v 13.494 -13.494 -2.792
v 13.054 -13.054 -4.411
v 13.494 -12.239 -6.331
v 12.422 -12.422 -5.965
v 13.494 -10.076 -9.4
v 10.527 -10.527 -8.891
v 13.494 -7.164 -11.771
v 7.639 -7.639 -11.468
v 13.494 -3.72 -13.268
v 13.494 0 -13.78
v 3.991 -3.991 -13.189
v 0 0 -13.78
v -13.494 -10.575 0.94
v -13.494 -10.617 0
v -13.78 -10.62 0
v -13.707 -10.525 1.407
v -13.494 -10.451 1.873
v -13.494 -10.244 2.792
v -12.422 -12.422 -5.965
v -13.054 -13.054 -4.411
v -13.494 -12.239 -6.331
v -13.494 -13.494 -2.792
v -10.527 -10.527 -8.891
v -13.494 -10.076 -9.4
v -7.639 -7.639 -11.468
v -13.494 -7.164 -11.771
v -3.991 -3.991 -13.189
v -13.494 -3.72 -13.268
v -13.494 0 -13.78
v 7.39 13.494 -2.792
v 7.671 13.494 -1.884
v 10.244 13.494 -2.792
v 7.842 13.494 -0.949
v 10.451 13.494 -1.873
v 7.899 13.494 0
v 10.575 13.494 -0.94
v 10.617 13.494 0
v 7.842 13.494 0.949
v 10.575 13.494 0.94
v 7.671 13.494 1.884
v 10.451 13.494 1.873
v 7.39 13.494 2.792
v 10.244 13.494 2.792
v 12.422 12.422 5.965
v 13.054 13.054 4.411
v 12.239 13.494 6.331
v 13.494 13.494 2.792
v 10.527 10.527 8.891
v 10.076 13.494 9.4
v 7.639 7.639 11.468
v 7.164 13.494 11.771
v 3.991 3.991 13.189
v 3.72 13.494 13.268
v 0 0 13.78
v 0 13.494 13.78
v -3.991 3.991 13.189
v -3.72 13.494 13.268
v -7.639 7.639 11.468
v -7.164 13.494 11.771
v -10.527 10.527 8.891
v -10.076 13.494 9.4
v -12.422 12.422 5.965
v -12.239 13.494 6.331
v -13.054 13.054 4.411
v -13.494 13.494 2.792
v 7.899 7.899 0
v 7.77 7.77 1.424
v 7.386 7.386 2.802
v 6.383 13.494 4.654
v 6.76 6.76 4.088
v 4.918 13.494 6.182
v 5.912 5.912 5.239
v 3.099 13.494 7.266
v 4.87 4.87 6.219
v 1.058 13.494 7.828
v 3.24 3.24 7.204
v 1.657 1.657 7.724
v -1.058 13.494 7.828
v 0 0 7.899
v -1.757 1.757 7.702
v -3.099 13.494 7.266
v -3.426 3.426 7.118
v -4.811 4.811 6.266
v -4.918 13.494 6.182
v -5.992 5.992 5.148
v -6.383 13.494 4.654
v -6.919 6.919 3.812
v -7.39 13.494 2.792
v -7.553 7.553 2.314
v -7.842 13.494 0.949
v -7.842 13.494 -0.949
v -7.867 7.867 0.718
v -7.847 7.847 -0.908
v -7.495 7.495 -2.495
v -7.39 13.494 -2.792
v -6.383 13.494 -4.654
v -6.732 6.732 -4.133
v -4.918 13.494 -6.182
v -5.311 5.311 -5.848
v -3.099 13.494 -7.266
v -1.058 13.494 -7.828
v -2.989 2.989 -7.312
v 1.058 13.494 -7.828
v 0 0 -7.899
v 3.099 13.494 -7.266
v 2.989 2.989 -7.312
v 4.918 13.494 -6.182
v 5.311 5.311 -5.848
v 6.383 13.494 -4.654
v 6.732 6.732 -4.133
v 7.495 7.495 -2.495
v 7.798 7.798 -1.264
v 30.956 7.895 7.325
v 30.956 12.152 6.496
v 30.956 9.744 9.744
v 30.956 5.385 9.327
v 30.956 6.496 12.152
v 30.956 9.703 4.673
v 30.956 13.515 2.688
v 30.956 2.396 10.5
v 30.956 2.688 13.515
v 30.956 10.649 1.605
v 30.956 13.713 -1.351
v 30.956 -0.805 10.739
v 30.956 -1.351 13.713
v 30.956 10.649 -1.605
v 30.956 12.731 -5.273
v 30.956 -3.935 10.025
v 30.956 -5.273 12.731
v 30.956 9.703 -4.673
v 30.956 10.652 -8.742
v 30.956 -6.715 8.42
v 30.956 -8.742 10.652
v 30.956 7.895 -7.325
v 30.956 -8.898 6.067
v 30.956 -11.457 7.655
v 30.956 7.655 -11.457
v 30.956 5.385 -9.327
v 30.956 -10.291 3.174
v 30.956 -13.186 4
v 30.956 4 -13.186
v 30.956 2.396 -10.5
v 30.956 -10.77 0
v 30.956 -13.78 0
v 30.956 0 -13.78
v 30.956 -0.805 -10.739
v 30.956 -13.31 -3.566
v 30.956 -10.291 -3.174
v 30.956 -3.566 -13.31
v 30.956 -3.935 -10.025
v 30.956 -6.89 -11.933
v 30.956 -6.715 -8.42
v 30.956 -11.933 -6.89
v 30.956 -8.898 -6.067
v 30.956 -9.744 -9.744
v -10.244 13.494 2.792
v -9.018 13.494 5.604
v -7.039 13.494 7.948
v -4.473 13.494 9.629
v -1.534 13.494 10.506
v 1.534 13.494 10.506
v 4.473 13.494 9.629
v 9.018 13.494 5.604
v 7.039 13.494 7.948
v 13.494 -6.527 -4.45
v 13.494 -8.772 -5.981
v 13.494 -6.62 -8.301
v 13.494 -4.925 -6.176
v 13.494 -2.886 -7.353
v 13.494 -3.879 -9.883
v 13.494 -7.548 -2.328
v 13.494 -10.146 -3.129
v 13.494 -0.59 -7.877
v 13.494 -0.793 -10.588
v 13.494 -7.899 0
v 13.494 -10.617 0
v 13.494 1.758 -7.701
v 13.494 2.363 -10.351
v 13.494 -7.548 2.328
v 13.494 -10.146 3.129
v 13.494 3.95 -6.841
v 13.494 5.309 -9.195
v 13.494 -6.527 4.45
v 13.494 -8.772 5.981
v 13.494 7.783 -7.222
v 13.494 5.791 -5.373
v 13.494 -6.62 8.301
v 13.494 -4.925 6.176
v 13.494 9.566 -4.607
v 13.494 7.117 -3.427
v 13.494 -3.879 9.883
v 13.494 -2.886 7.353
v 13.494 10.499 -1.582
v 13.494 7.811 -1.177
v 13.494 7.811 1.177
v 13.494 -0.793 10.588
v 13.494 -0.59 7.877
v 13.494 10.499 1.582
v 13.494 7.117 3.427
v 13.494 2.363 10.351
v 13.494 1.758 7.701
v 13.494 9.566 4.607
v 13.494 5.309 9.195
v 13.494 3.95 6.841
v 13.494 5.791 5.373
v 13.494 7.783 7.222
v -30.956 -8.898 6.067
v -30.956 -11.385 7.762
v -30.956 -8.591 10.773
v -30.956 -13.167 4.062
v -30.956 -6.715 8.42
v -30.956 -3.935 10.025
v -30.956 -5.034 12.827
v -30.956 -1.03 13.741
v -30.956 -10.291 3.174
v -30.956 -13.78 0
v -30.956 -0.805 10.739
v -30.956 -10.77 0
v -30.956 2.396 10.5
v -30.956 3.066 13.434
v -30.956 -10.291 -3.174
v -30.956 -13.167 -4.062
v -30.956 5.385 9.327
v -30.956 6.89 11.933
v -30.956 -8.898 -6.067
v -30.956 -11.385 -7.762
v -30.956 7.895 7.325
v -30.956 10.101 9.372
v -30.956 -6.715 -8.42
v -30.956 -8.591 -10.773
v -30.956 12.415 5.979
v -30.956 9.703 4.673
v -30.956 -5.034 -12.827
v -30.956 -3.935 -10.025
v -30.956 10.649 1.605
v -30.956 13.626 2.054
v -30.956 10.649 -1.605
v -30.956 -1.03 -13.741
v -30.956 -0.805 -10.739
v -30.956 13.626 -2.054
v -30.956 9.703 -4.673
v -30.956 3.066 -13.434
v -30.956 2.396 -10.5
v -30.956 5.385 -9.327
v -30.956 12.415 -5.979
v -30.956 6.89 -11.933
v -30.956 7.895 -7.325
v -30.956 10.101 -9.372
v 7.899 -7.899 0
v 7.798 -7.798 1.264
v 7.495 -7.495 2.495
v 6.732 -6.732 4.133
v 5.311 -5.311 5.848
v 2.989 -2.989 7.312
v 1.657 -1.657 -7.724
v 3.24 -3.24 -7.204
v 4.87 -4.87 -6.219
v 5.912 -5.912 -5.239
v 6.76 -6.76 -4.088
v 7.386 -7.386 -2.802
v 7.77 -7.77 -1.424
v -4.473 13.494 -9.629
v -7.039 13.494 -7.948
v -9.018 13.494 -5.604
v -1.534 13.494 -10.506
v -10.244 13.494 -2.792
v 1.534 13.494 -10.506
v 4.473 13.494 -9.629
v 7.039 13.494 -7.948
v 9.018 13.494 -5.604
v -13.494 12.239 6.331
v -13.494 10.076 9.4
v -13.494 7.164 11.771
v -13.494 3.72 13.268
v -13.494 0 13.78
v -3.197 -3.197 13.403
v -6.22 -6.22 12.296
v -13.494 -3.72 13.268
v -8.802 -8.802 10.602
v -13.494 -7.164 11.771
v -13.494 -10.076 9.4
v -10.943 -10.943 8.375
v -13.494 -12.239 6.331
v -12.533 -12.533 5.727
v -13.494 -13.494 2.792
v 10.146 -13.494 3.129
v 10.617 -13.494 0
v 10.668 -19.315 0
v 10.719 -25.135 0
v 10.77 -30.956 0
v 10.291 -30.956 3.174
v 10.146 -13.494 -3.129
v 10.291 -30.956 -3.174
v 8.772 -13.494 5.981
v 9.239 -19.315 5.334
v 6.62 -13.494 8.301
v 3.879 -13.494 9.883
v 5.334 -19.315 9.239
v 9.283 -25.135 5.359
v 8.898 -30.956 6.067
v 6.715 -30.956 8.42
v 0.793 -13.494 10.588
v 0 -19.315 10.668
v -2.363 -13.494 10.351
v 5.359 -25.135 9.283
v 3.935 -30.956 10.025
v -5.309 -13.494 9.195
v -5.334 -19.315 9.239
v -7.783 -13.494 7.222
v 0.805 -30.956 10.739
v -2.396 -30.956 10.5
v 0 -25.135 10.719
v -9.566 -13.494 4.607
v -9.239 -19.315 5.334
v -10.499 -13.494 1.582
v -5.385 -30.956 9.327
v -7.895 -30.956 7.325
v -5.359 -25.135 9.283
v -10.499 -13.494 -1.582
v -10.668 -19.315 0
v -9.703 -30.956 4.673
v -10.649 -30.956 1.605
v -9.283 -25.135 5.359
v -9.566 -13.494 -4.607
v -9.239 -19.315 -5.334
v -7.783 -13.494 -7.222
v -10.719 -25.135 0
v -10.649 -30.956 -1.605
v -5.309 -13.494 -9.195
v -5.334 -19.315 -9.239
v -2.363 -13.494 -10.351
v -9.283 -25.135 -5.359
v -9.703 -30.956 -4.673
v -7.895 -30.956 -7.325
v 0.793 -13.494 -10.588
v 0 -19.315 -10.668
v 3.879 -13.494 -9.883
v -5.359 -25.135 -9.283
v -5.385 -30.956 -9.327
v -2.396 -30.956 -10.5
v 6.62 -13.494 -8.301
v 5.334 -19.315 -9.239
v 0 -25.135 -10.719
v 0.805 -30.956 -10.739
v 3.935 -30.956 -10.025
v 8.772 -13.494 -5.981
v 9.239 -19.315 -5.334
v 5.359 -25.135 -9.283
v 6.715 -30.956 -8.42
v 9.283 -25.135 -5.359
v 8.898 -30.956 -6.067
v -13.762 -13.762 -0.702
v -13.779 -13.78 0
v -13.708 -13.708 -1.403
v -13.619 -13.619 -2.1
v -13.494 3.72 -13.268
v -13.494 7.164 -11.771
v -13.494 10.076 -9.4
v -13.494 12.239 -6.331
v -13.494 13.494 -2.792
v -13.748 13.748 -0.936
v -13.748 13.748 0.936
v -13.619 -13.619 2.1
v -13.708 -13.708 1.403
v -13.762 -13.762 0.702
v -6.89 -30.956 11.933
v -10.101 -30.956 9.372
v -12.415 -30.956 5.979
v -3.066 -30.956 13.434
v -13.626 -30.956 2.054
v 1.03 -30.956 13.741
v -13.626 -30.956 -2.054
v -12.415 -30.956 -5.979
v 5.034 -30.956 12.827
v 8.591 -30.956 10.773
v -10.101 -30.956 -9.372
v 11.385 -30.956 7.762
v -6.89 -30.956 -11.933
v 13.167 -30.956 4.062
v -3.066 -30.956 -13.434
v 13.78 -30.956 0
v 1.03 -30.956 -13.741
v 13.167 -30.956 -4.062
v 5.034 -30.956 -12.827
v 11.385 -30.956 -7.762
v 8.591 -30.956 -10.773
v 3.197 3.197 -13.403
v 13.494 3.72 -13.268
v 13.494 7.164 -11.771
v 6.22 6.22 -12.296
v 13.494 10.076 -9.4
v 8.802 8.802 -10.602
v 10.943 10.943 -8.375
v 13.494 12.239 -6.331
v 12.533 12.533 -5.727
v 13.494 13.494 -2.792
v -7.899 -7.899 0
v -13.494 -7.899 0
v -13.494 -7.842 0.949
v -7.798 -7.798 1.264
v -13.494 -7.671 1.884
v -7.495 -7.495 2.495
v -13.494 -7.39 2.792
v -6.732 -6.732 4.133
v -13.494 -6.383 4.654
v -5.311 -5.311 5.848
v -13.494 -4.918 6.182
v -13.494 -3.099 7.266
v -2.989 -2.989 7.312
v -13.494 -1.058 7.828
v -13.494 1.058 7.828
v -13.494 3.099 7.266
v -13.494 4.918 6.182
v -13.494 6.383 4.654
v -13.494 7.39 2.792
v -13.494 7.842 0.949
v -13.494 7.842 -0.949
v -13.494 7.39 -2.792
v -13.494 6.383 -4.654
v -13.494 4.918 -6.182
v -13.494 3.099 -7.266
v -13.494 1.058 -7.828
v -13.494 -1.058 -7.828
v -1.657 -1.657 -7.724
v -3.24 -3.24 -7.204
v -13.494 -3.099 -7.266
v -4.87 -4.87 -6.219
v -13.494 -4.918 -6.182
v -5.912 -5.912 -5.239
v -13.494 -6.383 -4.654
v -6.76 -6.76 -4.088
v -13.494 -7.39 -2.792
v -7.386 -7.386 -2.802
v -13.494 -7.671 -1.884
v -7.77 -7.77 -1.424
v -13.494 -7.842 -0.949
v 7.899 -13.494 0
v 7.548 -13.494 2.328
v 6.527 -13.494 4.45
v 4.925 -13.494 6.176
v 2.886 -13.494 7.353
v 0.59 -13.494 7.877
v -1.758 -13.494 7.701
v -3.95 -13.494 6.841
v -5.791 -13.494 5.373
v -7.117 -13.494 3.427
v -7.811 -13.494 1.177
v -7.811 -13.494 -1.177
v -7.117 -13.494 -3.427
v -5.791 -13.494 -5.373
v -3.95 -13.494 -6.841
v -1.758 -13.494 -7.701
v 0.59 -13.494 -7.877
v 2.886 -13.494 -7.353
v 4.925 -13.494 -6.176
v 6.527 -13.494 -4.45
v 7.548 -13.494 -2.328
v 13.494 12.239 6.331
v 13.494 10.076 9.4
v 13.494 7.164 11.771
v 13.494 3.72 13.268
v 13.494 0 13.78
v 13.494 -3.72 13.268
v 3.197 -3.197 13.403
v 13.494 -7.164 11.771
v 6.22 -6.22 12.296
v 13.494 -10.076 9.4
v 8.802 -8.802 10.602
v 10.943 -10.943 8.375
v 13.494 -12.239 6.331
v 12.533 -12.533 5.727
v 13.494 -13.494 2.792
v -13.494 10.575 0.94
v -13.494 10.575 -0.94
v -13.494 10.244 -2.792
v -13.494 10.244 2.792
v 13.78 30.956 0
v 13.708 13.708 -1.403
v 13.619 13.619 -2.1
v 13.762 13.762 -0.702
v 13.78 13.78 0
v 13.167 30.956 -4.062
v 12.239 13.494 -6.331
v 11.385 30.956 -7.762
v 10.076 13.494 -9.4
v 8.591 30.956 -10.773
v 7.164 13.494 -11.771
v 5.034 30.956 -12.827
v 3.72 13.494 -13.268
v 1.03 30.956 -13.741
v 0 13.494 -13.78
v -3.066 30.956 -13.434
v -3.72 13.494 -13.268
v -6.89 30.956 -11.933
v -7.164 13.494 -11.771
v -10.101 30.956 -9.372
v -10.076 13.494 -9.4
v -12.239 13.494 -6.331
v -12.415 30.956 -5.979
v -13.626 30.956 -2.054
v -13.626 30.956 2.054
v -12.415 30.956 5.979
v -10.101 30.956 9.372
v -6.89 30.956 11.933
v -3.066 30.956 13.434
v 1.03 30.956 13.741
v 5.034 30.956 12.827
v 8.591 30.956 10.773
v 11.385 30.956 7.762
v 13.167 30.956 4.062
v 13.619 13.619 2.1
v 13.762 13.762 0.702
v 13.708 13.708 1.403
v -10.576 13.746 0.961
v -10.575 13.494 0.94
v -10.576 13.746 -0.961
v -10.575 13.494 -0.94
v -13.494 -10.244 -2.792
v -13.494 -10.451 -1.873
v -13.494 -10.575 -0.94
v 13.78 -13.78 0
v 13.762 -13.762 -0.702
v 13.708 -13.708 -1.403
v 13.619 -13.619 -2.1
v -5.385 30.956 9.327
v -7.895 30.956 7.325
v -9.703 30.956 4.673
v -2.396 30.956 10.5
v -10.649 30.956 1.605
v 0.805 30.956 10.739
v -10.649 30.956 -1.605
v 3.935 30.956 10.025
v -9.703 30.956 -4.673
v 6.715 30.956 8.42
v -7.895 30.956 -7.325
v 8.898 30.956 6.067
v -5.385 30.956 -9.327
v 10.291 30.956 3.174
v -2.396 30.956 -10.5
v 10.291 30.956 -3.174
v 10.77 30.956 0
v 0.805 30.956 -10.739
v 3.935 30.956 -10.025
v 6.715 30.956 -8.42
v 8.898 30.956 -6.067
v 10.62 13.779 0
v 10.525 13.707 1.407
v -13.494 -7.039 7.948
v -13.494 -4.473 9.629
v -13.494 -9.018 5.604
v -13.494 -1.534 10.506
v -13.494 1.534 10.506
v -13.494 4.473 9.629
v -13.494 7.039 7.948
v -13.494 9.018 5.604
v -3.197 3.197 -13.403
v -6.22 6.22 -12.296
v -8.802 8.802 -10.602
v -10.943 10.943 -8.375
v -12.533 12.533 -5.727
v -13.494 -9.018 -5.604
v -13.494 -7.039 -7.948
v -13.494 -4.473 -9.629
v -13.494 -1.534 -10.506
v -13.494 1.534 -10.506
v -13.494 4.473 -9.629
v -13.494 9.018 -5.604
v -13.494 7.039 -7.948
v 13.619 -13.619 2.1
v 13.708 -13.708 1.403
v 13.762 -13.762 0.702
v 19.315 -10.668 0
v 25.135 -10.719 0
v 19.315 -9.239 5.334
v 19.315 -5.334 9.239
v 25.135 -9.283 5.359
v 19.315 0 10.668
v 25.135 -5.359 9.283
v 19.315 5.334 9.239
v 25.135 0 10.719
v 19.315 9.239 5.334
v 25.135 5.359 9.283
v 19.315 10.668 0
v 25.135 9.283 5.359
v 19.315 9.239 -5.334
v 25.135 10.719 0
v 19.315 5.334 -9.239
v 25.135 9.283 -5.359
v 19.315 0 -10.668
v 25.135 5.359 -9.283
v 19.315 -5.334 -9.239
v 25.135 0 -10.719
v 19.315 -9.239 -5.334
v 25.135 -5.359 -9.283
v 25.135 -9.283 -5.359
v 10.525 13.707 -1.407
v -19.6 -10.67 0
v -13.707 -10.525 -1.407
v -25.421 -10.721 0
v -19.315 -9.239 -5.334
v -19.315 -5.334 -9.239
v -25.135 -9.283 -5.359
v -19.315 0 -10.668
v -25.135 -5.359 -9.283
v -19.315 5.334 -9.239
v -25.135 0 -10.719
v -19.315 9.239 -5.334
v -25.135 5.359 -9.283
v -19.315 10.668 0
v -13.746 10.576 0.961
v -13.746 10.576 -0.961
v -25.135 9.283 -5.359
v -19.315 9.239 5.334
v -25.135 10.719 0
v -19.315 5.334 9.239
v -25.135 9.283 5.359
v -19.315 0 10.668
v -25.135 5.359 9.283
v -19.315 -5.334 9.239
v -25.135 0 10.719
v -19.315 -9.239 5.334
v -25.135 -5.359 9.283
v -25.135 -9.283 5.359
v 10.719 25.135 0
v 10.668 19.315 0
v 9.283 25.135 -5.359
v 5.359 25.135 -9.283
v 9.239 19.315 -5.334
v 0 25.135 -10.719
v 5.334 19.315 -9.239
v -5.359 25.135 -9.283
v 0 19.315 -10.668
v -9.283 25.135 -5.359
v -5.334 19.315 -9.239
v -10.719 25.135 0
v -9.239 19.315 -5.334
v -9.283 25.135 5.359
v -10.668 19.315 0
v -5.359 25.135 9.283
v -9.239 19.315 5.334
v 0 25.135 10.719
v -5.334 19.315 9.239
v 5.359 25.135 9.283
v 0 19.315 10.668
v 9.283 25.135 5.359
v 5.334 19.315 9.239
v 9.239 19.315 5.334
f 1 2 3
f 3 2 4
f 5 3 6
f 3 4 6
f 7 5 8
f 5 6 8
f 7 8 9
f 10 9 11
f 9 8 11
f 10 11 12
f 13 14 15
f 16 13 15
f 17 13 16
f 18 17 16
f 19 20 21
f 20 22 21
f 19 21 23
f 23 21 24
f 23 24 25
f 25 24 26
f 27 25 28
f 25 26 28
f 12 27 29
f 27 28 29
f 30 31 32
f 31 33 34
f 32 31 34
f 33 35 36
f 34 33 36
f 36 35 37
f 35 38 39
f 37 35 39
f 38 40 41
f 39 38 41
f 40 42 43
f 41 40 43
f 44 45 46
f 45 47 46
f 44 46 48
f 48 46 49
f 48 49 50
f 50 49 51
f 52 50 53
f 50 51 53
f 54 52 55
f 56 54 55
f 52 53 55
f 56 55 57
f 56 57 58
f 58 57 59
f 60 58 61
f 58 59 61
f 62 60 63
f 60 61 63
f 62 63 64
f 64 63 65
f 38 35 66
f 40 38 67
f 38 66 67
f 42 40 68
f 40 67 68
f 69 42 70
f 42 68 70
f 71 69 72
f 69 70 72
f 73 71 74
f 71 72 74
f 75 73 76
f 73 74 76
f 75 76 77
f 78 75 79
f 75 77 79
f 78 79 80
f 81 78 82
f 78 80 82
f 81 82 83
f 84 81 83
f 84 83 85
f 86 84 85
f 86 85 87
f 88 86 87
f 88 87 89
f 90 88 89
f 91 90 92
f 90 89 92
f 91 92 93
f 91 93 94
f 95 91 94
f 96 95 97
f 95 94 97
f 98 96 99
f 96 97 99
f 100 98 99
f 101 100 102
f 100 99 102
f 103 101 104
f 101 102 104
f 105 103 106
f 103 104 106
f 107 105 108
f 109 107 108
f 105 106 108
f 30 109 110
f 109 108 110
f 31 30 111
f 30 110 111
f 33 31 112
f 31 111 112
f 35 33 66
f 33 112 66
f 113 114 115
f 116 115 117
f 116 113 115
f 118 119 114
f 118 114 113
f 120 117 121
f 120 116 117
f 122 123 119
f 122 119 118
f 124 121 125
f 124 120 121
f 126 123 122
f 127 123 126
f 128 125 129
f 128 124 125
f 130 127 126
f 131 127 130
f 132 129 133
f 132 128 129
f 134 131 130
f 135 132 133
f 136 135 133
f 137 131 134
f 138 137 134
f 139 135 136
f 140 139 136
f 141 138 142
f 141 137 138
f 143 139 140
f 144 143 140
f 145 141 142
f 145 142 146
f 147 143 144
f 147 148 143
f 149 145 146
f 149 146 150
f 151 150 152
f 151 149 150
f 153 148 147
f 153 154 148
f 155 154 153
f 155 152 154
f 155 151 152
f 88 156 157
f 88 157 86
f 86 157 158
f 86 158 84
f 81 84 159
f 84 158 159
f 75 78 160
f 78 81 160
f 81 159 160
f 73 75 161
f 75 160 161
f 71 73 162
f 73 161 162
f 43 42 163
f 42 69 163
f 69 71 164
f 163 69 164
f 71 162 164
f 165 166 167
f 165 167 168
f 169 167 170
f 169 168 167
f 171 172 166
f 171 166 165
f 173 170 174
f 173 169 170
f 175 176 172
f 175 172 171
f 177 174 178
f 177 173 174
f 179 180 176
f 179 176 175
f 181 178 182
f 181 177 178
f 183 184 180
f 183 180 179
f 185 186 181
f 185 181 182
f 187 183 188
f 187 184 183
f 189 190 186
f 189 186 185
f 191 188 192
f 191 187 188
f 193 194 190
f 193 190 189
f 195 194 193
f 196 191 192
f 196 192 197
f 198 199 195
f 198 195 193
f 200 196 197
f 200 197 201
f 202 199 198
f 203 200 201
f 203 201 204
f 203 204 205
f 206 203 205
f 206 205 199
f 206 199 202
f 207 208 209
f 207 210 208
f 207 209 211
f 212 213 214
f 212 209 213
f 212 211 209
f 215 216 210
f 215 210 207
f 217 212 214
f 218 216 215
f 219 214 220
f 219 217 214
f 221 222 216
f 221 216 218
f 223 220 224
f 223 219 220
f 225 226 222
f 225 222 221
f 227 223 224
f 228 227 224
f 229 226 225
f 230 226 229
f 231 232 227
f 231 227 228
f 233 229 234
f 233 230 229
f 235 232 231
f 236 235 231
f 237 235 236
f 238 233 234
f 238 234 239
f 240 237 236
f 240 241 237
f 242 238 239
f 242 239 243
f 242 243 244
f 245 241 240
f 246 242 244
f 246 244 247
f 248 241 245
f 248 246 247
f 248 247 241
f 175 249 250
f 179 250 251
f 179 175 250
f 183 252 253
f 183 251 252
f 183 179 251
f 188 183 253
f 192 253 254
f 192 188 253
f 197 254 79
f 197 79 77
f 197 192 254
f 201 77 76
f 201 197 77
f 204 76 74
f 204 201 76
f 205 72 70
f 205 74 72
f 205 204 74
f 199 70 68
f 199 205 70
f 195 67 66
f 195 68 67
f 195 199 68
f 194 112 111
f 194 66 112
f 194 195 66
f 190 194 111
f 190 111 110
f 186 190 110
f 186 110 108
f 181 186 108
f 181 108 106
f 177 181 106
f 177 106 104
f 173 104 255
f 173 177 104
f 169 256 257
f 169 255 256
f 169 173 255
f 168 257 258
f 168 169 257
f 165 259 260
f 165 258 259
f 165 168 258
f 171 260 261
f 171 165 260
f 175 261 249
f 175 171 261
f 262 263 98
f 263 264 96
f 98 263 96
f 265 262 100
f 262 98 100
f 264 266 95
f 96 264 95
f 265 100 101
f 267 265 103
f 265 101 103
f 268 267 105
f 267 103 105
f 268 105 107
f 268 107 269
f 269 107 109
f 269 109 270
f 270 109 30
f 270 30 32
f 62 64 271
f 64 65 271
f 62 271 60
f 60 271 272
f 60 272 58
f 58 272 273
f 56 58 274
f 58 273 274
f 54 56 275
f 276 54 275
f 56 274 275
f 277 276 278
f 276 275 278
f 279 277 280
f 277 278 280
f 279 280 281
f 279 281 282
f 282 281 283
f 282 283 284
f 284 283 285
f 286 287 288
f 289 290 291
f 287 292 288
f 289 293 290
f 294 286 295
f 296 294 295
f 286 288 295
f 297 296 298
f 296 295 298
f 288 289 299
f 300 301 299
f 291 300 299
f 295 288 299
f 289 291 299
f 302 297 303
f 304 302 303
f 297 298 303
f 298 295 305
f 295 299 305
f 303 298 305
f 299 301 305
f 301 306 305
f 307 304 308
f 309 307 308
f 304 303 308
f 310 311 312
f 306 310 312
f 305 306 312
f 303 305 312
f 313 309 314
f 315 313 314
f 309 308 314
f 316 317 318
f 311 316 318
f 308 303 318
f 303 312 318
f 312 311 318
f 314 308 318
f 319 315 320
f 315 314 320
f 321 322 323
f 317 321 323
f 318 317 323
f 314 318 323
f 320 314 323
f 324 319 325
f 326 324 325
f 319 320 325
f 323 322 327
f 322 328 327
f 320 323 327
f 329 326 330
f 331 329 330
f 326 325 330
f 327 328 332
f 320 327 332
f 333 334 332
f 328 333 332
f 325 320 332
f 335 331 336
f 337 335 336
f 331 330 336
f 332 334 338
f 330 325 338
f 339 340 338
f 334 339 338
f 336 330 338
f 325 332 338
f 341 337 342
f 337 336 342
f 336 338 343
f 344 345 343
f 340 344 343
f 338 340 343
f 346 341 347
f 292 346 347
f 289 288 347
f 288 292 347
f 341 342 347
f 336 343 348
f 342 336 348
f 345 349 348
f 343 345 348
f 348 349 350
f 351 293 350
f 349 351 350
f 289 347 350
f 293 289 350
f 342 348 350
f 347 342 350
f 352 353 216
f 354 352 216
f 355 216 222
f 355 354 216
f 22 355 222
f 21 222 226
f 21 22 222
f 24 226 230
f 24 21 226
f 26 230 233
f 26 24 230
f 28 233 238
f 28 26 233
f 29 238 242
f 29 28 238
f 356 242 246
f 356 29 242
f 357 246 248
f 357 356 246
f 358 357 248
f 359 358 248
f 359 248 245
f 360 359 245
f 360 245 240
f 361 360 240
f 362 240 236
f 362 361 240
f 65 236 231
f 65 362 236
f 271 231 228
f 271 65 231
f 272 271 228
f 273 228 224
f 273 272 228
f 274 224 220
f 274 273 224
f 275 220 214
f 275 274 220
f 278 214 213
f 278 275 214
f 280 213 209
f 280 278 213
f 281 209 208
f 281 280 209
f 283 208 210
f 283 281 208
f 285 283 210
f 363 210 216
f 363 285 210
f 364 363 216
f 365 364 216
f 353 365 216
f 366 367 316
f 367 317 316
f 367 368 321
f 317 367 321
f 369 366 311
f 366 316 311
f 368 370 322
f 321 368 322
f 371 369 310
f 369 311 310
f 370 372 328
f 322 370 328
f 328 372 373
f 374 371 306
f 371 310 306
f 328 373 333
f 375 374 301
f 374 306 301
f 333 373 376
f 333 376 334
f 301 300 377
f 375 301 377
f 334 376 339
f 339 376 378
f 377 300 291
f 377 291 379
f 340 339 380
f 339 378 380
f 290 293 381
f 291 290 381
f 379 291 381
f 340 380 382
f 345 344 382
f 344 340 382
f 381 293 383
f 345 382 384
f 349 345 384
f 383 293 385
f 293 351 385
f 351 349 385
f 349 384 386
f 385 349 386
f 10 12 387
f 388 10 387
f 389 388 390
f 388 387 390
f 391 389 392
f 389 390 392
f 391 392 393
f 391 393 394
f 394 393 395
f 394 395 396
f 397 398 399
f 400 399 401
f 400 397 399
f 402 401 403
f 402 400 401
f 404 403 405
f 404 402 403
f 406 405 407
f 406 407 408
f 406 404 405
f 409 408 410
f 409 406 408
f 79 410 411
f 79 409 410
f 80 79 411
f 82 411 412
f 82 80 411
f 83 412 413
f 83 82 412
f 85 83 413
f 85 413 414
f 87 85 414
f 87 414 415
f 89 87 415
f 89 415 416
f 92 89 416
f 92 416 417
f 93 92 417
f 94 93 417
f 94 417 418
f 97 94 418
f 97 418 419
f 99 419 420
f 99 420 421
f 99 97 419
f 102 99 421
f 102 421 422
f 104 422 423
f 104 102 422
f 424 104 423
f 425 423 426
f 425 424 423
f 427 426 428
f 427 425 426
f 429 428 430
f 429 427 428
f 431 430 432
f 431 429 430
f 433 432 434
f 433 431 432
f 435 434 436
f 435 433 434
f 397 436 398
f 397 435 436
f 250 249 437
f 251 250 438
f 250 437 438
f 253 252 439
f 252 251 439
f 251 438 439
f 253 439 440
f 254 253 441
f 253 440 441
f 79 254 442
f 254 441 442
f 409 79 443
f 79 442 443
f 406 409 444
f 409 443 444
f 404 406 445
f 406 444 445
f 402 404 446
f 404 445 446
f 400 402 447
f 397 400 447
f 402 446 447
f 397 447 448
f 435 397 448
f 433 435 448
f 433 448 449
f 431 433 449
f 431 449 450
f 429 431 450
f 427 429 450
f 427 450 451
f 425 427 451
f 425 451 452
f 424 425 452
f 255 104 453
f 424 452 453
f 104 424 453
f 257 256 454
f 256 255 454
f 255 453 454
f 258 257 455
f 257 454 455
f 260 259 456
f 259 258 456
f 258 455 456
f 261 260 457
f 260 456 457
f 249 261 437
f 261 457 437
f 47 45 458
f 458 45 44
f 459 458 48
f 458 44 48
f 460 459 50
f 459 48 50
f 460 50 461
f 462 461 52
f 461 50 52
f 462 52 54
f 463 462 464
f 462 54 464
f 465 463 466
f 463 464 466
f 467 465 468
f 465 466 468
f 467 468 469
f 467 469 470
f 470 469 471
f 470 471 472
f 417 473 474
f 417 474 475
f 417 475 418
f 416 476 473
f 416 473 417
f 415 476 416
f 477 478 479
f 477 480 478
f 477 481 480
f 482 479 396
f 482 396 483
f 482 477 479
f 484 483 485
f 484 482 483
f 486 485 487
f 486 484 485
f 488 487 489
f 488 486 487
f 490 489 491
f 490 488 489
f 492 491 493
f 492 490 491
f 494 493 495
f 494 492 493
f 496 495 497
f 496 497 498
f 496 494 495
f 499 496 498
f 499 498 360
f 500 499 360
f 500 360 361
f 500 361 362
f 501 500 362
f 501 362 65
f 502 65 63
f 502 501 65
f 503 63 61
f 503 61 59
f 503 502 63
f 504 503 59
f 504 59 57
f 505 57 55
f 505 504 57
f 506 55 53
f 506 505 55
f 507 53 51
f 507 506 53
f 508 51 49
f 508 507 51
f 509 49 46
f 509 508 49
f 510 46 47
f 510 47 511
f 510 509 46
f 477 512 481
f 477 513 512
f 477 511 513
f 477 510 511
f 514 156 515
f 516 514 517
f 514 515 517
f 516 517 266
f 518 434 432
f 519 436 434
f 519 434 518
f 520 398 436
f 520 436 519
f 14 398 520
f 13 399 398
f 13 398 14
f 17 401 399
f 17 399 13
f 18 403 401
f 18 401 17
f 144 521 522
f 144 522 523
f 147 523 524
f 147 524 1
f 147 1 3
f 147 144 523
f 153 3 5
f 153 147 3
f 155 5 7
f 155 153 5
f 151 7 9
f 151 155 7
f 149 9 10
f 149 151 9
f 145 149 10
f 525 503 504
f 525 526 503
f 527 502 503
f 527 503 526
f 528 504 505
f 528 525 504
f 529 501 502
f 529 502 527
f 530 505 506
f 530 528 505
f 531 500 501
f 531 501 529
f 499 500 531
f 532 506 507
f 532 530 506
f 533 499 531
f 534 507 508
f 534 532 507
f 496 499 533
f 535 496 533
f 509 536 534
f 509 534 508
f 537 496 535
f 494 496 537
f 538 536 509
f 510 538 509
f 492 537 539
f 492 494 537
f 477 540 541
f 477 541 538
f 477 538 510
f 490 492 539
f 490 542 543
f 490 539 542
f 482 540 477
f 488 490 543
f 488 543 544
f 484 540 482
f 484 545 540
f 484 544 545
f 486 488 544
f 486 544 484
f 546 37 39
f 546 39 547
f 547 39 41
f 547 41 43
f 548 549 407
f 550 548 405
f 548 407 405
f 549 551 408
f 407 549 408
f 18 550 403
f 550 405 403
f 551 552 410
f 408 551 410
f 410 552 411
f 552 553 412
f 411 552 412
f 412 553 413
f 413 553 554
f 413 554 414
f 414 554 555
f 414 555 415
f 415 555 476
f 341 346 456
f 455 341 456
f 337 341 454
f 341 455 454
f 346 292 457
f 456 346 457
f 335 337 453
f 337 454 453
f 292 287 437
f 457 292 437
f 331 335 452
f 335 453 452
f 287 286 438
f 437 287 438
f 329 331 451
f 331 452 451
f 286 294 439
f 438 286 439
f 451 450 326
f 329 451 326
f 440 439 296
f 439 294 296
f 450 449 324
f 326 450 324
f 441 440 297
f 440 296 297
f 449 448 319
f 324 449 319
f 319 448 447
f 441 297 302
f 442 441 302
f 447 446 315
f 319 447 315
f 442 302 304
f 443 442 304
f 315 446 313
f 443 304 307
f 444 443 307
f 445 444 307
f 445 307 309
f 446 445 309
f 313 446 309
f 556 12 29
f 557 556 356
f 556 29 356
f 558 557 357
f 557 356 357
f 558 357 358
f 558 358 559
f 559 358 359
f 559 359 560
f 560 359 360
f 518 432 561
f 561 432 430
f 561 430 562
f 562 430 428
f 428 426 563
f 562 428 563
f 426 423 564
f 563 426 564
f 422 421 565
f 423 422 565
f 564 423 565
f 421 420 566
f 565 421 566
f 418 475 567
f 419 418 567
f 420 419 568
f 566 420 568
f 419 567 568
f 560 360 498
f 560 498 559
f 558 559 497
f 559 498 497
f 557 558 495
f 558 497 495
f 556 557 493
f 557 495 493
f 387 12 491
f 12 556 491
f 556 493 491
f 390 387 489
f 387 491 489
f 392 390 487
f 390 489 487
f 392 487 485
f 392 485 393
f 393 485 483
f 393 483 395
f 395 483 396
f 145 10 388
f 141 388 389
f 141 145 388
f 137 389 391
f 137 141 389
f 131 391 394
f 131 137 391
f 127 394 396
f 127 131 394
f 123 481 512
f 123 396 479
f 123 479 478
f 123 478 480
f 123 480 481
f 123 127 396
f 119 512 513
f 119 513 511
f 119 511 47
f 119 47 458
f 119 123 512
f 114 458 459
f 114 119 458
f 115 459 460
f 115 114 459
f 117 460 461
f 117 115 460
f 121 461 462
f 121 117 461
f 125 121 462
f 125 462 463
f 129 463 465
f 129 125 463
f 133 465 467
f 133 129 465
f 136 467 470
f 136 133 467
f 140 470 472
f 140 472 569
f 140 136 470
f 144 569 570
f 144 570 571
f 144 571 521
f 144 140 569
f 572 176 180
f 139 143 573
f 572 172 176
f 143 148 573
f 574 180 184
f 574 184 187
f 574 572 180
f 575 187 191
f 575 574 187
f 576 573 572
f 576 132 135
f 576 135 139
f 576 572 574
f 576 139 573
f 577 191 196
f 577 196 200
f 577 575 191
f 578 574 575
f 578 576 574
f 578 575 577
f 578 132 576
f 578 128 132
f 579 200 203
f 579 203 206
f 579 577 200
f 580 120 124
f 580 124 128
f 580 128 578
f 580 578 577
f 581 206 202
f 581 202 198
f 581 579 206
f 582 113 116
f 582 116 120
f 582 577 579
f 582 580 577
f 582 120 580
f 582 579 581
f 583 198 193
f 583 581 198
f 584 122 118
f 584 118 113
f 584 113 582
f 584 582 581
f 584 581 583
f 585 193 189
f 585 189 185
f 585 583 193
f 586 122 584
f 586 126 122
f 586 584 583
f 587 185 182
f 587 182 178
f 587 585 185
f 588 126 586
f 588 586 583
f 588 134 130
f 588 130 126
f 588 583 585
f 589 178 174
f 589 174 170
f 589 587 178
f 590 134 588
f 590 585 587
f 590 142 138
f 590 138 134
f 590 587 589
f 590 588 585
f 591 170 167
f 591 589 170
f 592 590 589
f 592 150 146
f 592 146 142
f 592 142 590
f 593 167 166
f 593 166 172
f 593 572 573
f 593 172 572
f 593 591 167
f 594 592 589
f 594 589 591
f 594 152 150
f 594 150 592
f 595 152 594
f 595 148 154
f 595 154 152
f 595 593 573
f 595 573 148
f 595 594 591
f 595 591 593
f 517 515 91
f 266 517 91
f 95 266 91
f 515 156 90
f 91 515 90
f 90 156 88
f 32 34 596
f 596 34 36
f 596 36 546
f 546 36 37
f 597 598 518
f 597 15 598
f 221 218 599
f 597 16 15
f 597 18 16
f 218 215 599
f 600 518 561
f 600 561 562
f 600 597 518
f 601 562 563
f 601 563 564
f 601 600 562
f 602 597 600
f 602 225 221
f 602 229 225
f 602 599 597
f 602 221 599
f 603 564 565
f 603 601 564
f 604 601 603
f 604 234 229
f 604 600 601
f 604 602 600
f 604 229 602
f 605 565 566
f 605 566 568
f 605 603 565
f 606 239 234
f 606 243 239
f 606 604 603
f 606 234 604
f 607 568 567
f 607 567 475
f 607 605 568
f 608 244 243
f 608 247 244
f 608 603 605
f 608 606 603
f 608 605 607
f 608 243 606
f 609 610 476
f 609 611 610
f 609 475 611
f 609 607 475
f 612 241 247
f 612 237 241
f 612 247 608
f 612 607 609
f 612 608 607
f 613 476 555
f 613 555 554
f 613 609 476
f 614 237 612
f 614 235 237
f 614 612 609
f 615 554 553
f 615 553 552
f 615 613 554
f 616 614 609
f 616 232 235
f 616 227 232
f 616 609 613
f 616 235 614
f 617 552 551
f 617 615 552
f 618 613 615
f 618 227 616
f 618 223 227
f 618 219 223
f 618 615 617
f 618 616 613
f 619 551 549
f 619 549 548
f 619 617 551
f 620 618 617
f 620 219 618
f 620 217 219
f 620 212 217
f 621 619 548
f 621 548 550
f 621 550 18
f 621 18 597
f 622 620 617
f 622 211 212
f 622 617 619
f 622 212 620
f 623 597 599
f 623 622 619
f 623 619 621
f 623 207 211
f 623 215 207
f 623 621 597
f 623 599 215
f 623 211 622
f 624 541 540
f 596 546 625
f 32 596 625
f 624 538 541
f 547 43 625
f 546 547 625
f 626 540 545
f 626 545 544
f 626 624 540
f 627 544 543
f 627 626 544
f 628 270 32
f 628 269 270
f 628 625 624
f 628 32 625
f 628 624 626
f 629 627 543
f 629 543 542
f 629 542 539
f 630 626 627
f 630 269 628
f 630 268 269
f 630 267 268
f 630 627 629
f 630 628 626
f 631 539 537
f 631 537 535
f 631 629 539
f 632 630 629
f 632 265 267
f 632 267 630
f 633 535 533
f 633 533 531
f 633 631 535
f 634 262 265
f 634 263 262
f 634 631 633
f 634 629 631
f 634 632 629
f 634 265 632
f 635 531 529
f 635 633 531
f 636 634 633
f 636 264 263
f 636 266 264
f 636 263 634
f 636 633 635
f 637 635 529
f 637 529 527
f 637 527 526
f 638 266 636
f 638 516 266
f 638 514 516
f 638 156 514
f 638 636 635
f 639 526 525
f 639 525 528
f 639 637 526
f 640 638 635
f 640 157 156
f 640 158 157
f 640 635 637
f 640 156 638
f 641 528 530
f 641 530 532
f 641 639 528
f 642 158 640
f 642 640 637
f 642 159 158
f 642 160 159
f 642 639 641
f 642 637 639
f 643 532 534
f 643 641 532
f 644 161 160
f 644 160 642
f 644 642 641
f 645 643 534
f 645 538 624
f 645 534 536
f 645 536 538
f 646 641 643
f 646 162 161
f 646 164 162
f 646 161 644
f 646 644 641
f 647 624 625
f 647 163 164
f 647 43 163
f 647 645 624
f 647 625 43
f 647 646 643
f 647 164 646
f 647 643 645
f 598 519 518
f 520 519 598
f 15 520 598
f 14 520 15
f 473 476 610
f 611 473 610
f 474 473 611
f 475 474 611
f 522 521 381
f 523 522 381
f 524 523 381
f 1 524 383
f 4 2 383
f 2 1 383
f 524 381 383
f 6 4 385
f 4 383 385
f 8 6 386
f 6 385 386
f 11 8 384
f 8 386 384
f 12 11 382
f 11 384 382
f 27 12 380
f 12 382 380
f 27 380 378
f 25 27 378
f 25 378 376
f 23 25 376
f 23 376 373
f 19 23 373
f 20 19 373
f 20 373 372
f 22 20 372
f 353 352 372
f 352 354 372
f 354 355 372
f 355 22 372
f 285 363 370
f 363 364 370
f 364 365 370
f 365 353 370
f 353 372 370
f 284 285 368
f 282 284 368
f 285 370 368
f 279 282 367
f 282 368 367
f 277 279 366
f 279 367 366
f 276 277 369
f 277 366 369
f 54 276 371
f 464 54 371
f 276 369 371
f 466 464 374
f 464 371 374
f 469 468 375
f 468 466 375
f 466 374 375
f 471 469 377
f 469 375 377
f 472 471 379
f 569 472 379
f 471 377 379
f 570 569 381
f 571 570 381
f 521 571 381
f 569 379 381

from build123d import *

# Parameters (mm, degrees)
SKETCH4_R           = 13.7795
BOSS_EXTRUDE1_DEPTH = 44.45
SKETCH5_R           = 13.7795
BOSS_EXTRUDE2_DEPTH = 44.45


with BuildPart() as part:
    # Sketch1 → Revolve1 (revolve)
    with BuildSketch(Plane.XY):
        Polygon((-30.95625, -13.7795), (-13.49375, -13.7795), (-13.49375, -10.6172), (-30.95625, -10.7696), align=None)
        Polygon((30.95625, -10.7696), (13.49375, -10.6172), (13.49375, -13.7795), (30.95625, -13.7795), align=None)
    revolve(axis=Axis((-30.95625, 0, 0), (1, 0, 0)))



with BuildPart() as body_2:
    # Sketch2 → Revolve2 (revolve)
    with BuildSketch(Plane.XY):
        Polygon((10.7696, 30.95625), (10.6172, 13.49375), (13.7795, 13.49375), (13.7795, 30.95625), align=None)
        Polygon((13.7795, -30.95625), (10.7696, -30.95625), (10.6172, -13.49375), (13.7795, -13.49375), align=None)
    revolve(axis=Axis((0, 0, 0), (0, 1, 0)))


with BuildPart() as part_1:
    add(part.part)

    add(body_2.part)  # Boss-Extrude1 merges body 2
    # Sketch4 → Boss-Extrude1 (add)
    with BuildSketch(Plane(origin=(-13.49375, 0, 0), x_dir=(0, 0, -1), z_dir=(1, 0, 0))):
        Circle(SKETCH4_R)
    extrude(amount=BOSS_EXTRUDE1_DEPTH)

    # Sketch5 → Boss-Extrude2 (add)
    with BuildSketch(Plane.XZ.offset(-13.49375)):
        Circle(SKETCH5_R)
    extrude(amount=BOSS_EXTRUDE2_DEPTH)

    # Sketch6 → Cut-Revolve1 (revolve, cut)
    with BuildSketch(Plane.XY):
        Polygon((-30.95625, -10.7696), (-13.49375, -10.6172), (-13.49375, -7.8994), (13.49375, -7.8994), (13.49375, -10.6172), (30.95625, -10.7696), (30.95625, 0), (-30.95625, 0), align=None)
    revolve(axis=Axis((30.95625, 0, 0), (-1, 0, 0)), mode=Mode.SUBTRACT)

    # Sketch7 → Cut-Revolve2 (revolve, cut)
    with BuildSketch(Plane.XY):
        Polygon((10.7696, 30.95625), (10.6172, 13.49375), (7.8994, 13.49375), (7.8994, -13.49375), (10.6172, -13.49375), (10.7696, -30.95625), (0, -30.95625), (0, 30.95625), align=None)
    revolve(axis=Axis((0, 30.95625, 0), (0, -1, 0)), mode=Mode.SUBTRACT)


solid = part_1.part
